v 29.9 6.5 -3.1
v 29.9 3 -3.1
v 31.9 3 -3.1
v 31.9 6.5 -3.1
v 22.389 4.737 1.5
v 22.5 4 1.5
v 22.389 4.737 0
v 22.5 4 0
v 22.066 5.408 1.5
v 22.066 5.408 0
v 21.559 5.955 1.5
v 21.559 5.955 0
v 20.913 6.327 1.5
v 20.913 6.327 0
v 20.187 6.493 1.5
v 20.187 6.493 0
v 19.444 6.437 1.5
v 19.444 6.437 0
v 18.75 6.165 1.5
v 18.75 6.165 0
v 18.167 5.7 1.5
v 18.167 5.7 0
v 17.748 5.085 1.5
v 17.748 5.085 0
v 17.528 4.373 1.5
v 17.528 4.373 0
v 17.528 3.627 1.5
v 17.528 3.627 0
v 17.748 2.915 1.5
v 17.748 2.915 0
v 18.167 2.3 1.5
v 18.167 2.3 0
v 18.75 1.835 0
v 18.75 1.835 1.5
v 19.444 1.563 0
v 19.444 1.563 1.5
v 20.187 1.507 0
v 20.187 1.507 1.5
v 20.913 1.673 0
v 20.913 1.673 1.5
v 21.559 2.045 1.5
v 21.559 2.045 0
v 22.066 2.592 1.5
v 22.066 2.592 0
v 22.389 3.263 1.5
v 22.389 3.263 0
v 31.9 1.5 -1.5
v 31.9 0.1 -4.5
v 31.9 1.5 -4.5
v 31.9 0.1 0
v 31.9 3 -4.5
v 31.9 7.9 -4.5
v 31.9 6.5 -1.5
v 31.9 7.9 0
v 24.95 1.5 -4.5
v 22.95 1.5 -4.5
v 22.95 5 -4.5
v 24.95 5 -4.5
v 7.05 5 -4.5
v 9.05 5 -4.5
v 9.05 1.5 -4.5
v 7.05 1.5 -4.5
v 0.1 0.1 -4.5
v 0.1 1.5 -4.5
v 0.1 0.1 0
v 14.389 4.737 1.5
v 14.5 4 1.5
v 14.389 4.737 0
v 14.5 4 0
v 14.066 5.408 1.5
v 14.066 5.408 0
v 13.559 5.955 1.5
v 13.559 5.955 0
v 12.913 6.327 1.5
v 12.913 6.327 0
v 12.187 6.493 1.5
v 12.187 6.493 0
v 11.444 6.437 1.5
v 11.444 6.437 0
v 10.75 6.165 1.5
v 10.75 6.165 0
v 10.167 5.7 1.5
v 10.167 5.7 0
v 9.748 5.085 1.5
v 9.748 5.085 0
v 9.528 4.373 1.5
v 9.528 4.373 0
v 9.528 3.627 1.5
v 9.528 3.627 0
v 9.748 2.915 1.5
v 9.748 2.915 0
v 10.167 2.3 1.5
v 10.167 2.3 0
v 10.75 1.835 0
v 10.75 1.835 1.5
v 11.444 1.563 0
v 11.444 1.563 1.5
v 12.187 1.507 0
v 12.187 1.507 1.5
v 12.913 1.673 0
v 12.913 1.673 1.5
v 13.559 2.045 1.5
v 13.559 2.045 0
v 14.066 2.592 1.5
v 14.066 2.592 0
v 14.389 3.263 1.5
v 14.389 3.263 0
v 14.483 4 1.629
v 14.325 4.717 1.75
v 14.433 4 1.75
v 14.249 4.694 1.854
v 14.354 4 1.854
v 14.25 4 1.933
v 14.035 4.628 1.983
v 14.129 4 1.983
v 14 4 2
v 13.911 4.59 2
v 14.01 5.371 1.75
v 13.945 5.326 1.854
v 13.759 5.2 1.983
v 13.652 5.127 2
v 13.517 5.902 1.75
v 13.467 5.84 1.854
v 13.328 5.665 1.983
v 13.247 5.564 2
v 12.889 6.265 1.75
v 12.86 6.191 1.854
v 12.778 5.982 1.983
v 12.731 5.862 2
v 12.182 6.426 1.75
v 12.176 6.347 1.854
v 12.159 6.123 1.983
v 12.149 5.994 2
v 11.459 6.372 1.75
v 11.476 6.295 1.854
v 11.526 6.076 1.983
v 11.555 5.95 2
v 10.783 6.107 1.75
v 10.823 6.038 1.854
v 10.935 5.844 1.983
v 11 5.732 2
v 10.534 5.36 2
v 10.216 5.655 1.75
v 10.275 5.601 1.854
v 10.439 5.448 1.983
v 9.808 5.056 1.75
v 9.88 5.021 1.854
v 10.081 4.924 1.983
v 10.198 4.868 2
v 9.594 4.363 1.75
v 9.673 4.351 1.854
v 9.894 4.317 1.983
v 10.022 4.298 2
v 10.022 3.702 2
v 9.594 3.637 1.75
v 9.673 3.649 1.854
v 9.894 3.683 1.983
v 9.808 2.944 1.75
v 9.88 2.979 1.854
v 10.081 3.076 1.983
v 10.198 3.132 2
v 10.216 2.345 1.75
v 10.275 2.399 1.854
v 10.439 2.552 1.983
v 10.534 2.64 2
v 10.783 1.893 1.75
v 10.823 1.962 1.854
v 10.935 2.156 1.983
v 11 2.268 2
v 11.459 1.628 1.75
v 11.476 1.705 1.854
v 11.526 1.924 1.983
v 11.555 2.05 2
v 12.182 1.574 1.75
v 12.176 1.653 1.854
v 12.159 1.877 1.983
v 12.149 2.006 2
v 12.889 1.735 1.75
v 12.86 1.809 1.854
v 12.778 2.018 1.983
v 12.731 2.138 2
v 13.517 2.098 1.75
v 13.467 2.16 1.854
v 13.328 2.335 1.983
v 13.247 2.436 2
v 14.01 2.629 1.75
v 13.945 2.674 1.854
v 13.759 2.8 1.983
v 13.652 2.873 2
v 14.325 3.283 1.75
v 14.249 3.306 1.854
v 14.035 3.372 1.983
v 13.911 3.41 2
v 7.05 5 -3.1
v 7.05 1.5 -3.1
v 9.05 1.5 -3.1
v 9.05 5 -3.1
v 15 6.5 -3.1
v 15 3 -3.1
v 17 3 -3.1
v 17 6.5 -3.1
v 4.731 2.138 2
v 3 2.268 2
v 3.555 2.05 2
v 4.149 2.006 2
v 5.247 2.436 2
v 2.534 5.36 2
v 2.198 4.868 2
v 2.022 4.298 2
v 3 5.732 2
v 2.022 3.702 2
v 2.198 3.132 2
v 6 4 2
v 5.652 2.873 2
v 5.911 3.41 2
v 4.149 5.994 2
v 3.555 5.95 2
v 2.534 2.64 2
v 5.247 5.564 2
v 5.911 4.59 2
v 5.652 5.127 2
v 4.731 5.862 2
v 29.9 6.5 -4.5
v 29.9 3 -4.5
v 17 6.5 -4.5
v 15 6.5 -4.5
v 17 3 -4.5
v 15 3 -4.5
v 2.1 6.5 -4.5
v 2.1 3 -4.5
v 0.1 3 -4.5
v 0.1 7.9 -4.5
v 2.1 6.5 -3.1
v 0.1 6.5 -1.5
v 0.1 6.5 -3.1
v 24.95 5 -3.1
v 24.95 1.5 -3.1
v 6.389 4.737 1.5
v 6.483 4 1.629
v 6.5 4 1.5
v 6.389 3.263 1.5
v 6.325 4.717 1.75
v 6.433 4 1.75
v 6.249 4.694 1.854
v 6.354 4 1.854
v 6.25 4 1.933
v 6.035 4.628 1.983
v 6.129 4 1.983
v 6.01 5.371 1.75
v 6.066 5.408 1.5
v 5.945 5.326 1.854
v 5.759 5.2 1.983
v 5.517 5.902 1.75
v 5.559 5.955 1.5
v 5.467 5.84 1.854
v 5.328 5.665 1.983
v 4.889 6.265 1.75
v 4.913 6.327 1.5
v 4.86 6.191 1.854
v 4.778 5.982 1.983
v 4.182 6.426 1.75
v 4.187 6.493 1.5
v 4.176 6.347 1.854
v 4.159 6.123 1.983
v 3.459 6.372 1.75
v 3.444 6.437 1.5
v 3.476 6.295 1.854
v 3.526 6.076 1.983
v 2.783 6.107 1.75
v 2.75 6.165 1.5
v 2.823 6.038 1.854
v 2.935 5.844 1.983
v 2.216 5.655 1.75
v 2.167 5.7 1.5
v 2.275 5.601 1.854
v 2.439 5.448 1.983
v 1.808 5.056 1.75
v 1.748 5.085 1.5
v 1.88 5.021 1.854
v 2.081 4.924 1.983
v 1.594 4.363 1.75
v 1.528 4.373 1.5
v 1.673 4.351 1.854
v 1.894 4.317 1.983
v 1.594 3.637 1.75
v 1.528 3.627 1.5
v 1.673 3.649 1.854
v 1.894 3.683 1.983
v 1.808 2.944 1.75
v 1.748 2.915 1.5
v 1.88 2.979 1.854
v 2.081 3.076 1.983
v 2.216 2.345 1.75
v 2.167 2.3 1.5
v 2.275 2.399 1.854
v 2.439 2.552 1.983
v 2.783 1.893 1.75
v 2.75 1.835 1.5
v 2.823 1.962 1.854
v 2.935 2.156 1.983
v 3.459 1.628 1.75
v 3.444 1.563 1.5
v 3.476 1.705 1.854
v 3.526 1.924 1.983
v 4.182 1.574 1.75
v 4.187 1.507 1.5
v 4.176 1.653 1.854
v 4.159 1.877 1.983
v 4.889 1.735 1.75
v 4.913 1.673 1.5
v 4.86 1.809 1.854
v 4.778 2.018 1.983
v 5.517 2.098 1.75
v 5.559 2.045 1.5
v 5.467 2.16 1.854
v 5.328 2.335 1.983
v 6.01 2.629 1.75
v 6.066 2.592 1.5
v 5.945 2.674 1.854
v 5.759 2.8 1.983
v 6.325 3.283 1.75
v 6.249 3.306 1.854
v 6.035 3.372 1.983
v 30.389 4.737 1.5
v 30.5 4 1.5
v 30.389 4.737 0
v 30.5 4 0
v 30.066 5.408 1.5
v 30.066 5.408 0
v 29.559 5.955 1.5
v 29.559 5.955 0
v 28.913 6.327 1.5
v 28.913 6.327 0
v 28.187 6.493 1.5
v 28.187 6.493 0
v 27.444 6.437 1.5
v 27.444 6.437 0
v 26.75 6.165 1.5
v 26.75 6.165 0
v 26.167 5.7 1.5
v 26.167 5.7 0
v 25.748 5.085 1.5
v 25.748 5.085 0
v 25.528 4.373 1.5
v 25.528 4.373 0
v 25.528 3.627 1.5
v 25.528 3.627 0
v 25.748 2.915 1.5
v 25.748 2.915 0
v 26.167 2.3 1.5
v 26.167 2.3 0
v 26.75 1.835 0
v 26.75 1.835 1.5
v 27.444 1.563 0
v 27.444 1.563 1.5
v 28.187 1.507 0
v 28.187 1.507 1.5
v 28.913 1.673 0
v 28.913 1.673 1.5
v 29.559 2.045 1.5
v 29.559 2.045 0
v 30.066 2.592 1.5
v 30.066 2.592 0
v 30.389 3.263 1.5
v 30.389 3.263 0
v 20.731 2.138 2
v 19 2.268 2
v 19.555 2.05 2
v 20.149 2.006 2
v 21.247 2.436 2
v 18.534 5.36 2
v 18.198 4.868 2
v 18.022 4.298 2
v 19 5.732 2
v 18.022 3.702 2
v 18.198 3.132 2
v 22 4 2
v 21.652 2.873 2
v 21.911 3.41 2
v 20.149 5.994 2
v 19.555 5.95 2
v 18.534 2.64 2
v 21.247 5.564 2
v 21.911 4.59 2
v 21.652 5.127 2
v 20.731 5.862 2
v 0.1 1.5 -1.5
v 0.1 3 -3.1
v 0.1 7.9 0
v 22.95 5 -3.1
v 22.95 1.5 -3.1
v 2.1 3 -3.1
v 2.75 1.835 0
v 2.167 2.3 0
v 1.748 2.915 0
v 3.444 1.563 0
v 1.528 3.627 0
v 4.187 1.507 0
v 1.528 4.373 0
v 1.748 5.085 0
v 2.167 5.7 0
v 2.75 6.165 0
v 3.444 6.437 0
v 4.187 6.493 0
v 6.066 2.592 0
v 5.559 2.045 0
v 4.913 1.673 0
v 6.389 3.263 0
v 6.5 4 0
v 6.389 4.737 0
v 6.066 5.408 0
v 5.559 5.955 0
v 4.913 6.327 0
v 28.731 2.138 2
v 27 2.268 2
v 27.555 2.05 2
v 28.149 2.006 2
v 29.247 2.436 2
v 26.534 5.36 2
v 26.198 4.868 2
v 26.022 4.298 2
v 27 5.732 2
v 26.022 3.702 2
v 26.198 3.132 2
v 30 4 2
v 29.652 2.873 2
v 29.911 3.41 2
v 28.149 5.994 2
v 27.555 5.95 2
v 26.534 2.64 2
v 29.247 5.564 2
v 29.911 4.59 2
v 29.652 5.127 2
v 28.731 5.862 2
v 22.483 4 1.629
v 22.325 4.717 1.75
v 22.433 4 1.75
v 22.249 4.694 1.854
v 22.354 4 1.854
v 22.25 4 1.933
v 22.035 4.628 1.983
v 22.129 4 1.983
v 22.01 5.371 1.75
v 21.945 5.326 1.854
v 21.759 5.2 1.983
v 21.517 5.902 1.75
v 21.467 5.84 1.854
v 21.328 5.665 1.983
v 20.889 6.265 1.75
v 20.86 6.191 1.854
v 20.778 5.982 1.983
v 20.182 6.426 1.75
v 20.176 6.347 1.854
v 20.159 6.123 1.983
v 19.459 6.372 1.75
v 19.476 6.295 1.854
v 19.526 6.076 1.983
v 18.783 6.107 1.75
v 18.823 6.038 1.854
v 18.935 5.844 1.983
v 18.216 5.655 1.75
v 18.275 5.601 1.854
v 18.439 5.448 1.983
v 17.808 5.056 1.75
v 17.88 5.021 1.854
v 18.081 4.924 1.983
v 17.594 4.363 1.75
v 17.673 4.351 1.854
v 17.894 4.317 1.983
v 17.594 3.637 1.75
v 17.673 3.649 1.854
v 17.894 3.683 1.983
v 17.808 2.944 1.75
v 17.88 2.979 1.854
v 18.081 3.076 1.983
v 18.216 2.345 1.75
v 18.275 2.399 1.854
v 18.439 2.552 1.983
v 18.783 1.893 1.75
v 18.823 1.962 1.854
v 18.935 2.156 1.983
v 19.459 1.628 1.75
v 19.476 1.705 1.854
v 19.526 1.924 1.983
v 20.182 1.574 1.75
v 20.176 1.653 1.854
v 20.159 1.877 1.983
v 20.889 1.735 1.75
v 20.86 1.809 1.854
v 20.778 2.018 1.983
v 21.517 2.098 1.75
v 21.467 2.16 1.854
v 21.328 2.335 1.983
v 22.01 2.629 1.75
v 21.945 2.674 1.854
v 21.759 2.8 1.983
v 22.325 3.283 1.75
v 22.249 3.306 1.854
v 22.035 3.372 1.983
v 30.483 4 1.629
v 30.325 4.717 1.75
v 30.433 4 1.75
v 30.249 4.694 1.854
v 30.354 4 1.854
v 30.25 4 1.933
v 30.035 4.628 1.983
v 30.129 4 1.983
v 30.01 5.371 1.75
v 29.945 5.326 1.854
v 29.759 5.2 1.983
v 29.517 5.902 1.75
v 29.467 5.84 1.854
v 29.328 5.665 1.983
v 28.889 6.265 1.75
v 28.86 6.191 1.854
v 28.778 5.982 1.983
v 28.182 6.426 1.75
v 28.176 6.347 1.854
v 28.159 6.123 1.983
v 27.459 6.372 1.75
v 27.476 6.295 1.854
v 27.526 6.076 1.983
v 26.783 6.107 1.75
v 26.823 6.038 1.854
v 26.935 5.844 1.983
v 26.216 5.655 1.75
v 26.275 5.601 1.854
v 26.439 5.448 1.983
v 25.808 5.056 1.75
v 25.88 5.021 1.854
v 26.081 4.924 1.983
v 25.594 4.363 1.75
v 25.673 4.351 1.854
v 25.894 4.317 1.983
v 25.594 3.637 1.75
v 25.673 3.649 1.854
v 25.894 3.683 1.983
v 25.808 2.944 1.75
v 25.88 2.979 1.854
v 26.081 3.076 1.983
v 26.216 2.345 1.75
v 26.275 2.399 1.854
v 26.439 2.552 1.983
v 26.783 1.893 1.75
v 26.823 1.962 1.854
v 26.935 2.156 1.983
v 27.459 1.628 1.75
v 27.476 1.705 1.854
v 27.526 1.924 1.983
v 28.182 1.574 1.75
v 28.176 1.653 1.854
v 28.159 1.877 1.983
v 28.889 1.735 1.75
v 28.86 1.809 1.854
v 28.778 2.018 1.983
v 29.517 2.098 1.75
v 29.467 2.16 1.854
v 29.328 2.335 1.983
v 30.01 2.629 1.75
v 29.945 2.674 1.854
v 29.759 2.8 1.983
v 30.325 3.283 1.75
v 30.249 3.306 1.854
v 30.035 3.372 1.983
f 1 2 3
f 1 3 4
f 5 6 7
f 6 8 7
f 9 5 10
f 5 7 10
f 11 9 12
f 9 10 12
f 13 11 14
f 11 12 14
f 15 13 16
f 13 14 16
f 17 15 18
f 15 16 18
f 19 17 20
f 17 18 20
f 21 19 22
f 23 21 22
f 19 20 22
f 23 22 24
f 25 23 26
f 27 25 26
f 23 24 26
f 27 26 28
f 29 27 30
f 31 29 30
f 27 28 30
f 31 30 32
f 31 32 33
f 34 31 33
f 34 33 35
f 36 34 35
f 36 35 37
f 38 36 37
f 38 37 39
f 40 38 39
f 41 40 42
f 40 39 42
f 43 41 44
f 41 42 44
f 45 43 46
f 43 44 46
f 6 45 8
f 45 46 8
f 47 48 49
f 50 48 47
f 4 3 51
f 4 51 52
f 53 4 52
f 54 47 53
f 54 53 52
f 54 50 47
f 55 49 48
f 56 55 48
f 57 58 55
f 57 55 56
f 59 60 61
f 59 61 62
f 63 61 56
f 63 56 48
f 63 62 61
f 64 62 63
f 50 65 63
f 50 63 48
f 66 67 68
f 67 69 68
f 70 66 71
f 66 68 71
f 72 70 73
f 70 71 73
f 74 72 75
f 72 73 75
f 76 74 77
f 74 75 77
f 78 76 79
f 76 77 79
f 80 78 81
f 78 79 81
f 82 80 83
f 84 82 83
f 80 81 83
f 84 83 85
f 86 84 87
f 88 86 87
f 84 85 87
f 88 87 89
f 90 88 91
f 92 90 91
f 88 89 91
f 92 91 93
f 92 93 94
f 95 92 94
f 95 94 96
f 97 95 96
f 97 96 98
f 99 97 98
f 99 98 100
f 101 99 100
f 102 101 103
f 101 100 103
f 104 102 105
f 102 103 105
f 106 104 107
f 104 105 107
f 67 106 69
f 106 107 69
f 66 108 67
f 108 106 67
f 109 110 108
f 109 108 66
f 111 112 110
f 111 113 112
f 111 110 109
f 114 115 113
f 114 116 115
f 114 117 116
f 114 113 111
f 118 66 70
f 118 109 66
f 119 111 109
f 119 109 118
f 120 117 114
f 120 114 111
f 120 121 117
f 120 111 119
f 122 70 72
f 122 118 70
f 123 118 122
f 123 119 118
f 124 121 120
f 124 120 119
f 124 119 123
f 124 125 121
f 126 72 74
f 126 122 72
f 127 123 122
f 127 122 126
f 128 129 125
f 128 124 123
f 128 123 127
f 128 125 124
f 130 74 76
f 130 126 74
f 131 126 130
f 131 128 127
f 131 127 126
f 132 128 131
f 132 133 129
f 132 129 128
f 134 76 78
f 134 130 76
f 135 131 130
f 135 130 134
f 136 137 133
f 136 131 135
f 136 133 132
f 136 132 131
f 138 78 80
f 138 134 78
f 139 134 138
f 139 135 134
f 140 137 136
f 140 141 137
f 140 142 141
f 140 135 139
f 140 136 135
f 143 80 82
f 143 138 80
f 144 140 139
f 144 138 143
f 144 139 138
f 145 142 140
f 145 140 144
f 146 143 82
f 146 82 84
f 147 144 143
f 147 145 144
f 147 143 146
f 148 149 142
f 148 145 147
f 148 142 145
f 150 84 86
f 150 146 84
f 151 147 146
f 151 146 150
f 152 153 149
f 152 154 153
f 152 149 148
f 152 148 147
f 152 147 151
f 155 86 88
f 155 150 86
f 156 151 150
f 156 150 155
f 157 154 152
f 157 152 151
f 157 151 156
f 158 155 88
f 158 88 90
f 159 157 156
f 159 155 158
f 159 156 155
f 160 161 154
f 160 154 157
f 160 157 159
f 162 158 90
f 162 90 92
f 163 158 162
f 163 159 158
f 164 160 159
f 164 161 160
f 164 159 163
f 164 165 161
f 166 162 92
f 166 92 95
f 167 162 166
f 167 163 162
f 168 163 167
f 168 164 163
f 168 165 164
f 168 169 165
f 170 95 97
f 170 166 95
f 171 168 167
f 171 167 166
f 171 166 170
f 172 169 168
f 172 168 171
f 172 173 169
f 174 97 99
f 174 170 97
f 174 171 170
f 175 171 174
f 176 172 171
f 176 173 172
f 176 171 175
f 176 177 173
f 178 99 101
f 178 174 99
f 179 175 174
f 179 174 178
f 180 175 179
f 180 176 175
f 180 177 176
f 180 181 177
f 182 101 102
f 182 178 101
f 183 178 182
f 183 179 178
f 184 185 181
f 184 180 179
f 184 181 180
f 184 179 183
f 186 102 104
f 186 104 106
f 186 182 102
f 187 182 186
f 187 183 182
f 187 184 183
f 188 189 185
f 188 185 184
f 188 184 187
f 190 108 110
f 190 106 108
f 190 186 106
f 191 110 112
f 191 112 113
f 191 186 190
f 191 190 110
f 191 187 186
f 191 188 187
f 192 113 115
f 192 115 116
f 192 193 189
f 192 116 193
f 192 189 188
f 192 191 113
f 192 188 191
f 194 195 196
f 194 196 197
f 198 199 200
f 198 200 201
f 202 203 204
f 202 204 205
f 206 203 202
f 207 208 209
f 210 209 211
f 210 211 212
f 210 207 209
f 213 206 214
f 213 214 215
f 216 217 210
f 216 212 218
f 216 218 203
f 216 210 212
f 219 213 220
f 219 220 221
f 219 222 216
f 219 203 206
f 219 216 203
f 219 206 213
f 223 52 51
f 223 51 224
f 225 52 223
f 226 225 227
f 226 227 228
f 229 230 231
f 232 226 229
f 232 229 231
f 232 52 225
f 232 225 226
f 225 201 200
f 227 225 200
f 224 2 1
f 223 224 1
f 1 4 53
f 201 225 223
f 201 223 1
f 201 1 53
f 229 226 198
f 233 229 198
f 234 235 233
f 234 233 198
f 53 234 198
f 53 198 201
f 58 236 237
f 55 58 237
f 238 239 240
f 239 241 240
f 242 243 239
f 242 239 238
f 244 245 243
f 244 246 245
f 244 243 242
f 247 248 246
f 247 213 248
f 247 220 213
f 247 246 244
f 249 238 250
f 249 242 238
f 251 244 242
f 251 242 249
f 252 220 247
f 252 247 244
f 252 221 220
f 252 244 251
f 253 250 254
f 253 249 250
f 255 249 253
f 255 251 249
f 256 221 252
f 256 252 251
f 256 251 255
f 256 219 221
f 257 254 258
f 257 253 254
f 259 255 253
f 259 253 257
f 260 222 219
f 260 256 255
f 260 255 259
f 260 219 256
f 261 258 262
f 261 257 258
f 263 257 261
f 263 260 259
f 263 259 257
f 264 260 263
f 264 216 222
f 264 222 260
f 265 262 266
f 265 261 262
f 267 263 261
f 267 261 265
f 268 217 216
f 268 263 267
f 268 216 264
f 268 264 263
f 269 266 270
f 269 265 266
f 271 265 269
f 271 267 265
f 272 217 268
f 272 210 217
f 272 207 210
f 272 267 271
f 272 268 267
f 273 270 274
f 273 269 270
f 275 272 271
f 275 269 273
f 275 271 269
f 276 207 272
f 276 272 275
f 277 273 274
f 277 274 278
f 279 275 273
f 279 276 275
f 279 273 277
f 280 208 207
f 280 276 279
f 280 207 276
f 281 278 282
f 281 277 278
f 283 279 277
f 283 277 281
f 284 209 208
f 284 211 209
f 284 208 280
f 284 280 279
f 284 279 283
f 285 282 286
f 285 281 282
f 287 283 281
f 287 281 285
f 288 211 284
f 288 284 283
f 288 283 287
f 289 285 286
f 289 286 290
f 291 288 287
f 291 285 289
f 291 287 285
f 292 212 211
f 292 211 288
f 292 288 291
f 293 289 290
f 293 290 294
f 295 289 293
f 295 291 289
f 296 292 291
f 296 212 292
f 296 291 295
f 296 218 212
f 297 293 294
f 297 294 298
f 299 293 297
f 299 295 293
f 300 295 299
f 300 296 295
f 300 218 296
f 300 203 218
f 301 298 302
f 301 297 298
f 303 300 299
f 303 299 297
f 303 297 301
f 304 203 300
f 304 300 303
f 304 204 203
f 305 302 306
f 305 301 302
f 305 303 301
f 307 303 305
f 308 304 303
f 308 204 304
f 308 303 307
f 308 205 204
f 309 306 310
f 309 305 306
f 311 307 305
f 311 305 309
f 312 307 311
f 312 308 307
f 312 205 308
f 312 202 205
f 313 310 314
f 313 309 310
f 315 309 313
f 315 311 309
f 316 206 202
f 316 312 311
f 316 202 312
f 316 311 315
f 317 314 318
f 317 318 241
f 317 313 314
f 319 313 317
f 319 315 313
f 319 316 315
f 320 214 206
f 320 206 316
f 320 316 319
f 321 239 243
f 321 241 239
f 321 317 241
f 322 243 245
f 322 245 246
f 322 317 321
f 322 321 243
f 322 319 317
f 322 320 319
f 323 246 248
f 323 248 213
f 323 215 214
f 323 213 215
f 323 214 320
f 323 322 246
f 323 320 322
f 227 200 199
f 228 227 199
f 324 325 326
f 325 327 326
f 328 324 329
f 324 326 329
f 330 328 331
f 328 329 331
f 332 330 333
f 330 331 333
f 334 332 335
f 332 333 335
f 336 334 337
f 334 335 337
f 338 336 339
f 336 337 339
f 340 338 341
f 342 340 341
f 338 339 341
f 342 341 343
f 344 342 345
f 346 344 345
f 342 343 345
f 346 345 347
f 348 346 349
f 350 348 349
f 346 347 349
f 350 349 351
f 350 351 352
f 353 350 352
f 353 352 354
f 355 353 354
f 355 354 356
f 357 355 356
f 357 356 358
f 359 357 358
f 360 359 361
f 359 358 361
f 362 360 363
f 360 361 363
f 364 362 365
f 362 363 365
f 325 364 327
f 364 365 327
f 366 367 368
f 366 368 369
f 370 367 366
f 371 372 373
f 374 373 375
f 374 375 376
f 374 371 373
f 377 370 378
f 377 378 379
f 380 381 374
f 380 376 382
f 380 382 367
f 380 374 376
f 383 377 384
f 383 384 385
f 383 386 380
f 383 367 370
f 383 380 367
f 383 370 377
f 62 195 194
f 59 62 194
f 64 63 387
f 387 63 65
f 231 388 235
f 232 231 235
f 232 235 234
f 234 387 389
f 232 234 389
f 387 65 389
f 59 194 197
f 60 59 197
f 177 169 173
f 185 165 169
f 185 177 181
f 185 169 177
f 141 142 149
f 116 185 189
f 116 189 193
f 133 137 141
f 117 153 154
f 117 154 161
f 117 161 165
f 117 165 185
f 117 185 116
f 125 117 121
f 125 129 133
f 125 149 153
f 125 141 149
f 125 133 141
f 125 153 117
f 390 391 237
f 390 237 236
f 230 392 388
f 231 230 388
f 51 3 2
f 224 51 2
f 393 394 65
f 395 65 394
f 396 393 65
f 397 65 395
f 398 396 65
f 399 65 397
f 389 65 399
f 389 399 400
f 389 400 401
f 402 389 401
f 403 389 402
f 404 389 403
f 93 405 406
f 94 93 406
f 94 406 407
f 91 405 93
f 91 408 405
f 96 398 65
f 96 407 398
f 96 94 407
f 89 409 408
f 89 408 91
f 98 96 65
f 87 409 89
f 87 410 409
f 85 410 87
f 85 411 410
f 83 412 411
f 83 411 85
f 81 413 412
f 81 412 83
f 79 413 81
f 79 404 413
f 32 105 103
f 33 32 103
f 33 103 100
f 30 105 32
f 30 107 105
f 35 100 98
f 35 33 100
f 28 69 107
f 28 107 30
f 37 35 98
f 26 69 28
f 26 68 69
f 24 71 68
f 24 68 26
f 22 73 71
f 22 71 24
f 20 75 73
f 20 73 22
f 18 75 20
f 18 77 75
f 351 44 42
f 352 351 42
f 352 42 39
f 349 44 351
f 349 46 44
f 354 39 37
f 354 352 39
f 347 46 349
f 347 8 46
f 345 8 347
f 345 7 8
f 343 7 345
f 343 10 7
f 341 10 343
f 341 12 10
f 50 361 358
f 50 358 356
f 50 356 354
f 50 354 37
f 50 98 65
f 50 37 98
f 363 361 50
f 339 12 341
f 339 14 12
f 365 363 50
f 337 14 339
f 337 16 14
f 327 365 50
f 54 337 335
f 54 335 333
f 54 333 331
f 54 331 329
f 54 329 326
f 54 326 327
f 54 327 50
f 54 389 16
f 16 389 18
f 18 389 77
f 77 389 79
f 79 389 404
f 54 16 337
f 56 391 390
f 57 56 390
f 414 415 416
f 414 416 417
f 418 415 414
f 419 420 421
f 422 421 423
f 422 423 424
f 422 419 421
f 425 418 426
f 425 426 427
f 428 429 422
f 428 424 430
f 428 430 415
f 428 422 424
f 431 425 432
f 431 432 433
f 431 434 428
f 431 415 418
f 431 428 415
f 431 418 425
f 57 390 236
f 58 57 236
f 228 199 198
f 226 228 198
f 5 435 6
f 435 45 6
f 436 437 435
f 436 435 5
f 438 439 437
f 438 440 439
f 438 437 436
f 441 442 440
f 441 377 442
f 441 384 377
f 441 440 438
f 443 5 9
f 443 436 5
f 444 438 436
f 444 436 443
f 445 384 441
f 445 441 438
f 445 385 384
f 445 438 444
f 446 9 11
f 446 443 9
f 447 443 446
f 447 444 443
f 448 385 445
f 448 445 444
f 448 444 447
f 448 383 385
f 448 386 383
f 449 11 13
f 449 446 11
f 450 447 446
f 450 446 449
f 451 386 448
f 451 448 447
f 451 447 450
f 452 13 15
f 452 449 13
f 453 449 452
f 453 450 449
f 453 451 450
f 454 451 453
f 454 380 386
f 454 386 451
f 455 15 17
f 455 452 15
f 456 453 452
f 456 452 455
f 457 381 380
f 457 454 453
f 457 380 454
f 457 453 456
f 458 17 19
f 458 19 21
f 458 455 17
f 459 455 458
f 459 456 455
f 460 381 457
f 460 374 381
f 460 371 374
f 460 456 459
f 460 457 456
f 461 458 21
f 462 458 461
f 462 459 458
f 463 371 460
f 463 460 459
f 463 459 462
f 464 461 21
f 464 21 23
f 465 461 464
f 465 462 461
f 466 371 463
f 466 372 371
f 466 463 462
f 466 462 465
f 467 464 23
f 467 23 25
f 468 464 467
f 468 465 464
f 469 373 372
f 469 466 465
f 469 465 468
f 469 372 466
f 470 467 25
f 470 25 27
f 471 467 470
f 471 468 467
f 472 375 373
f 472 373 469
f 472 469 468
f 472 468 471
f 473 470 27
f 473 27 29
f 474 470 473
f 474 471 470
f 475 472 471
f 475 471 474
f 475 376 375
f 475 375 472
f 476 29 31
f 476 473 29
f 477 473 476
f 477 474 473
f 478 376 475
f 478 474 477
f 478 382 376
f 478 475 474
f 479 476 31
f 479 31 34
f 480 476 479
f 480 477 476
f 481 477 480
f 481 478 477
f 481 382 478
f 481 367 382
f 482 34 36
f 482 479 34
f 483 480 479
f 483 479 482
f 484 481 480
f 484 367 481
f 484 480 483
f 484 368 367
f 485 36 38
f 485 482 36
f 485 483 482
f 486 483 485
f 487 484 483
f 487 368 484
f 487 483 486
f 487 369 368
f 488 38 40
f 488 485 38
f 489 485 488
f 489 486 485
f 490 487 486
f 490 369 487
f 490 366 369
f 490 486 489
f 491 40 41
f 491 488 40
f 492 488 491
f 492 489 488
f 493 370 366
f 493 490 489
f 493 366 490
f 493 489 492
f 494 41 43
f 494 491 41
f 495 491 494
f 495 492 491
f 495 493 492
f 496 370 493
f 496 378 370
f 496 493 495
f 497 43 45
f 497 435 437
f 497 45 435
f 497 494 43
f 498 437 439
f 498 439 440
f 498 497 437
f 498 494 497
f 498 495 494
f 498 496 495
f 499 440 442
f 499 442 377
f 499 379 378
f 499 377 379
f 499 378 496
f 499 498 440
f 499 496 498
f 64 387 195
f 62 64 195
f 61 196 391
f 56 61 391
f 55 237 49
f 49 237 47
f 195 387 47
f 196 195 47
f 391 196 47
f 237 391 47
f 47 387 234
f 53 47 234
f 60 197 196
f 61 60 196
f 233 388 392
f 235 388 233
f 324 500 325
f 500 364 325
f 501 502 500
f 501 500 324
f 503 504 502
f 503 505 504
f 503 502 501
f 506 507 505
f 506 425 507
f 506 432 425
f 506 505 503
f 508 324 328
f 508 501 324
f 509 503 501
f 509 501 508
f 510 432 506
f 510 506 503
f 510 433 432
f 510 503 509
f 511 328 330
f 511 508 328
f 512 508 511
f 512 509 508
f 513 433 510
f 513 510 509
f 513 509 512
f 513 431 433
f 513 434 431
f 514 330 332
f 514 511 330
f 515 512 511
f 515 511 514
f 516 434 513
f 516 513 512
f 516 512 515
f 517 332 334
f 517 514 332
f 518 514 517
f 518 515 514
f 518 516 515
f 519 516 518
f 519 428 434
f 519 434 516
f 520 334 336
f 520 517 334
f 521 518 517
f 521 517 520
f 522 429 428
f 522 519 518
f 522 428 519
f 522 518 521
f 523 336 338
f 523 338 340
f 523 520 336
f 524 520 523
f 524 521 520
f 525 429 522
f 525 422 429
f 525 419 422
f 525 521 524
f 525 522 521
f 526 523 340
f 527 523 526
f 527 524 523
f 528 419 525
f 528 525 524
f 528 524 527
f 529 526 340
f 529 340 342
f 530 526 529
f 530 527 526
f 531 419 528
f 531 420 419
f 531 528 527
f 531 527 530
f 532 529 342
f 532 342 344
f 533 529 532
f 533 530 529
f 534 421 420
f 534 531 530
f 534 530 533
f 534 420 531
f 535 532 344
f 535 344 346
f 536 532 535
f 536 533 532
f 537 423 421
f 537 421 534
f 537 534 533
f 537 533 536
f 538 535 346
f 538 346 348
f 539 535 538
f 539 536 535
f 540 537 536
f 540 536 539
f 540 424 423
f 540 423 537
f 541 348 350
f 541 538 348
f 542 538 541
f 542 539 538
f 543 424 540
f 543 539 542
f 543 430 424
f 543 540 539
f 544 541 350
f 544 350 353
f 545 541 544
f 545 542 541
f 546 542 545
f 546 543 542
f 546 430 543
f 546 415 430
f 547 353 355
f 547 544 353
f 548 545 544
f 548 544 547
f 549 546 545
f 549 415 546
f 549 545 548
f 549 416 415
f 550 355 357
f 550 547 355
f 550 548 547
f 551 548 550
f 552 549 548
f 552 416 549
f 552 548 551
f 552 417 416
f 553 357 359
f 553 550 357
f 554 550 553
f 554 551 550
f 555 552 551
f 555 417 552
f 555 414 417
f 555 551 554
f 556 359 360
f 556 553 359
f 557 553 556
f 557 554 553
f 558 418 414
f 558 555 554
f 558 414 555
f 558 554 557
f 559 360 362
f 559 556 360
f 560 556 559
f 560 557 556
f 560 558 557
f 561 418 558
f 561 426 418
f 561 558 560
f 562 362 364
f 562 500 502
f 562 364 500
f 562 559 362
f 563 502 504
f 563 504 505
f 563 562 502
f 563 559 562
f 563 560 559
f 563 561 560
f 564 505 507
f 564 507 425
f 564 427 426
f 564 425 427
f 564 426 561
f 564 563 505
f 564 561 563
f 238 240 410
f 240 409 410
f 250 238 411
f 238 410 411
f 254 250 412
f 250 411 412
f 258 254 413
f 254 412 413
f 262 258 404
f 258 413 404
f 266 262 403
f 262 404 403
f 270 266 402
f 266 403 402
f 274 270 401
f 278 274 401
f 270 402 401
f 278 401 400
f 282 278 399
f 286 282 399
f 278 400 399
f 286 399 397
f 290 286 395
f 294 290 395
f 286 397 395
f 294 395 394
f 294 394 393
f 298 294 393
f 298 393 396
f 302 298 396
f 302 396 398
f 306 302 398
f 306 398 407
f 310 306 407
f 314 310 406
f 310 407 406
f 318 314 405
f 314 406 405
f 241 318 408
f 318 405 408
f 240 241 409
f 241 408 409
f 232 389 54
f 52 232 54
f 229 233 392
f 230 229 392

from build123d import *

# Parameters (mm, degrees)
SKETCH001_W  = 31.8
SKETCH001_H  = 7.8
PAD_DEPTH    = 1.5
SKETCH002_R  = 2.5
PAD001_DEPTH = 2
FILLET_R     = 0.5
PAD002_DEPTH = 4.5
SKETCH004_W  = 5
SKETCH004_H  = 1.6
POCKET_DEPTH = 100


with BuildPart() as part:
    # Sketch001 → Pad (new body)
    with BuildSketch(Plane.XY):
        with Locations((16, 4)):
            Rectangle(SKETCH001_W, SKETCH001_H)
    extrude(amount=-PAD_DEPTH)

    # Sketch002 → Pad001 (join)
    with BuildSketch(Plane.XY):
        with Locations((4, 4)):
            Circle(SKETCH002_R)
        with Locations((12, 4)):
            Circle(SKETCH002_R)
        with Locations((20, 4)):
            Circle(SKETCH002_R)
        with Locations((28, 4)):
            Circle(SKETCH002_R)
    extrude(amount=PAD001_DEPTH)

    # Fillet
    fillet_edges = [part.edges().sort_by_distance(p)[0] for p in [
        (1.5, 4, 2),
        (9.5, 4, 2),
        (17.5, 4, 2),
        (25.5, 4, 2),
    ]]
    fillet(fillet_edges, radius=FILLET_R)

    # Sketch003 → Pad002 (join)
    with BuildSketch(Plane.XY):
        Polygon((0.1, 7.9), (31.9, 7.9), (31.9, 3), (29.9, 3), (29.9, 6.5), (17, 6.5), (17, 3), (15, 3), (15, 6.5), (2.1, 6.5), (2.1, 3), (0.1, 3), align=None)
        Polygon((0.1, 0.1), (0.1, 1.5), (7.05, 1.5), (7.05, 5), (9.05, 5), (9.05, 1.5), (22.95, 1.5), (22.95, 5), (24.95, 5), (24.95, 1.5), (31.9, 1.5), (31.9, 0.1), align=None)
    extrude(amount=-PAD002_DEPTH)

    # Sketch004 → Pocket (cut)
    with BuildSketch(Plane.YZ):
        with Locations((4, -2.3)):
            Rectangle(SKETCH004_W, SKETCH004_H)
    extrude(amount=POCKET_DEPTH, mode=Mode.SUBTRACT)


solid = part.part
